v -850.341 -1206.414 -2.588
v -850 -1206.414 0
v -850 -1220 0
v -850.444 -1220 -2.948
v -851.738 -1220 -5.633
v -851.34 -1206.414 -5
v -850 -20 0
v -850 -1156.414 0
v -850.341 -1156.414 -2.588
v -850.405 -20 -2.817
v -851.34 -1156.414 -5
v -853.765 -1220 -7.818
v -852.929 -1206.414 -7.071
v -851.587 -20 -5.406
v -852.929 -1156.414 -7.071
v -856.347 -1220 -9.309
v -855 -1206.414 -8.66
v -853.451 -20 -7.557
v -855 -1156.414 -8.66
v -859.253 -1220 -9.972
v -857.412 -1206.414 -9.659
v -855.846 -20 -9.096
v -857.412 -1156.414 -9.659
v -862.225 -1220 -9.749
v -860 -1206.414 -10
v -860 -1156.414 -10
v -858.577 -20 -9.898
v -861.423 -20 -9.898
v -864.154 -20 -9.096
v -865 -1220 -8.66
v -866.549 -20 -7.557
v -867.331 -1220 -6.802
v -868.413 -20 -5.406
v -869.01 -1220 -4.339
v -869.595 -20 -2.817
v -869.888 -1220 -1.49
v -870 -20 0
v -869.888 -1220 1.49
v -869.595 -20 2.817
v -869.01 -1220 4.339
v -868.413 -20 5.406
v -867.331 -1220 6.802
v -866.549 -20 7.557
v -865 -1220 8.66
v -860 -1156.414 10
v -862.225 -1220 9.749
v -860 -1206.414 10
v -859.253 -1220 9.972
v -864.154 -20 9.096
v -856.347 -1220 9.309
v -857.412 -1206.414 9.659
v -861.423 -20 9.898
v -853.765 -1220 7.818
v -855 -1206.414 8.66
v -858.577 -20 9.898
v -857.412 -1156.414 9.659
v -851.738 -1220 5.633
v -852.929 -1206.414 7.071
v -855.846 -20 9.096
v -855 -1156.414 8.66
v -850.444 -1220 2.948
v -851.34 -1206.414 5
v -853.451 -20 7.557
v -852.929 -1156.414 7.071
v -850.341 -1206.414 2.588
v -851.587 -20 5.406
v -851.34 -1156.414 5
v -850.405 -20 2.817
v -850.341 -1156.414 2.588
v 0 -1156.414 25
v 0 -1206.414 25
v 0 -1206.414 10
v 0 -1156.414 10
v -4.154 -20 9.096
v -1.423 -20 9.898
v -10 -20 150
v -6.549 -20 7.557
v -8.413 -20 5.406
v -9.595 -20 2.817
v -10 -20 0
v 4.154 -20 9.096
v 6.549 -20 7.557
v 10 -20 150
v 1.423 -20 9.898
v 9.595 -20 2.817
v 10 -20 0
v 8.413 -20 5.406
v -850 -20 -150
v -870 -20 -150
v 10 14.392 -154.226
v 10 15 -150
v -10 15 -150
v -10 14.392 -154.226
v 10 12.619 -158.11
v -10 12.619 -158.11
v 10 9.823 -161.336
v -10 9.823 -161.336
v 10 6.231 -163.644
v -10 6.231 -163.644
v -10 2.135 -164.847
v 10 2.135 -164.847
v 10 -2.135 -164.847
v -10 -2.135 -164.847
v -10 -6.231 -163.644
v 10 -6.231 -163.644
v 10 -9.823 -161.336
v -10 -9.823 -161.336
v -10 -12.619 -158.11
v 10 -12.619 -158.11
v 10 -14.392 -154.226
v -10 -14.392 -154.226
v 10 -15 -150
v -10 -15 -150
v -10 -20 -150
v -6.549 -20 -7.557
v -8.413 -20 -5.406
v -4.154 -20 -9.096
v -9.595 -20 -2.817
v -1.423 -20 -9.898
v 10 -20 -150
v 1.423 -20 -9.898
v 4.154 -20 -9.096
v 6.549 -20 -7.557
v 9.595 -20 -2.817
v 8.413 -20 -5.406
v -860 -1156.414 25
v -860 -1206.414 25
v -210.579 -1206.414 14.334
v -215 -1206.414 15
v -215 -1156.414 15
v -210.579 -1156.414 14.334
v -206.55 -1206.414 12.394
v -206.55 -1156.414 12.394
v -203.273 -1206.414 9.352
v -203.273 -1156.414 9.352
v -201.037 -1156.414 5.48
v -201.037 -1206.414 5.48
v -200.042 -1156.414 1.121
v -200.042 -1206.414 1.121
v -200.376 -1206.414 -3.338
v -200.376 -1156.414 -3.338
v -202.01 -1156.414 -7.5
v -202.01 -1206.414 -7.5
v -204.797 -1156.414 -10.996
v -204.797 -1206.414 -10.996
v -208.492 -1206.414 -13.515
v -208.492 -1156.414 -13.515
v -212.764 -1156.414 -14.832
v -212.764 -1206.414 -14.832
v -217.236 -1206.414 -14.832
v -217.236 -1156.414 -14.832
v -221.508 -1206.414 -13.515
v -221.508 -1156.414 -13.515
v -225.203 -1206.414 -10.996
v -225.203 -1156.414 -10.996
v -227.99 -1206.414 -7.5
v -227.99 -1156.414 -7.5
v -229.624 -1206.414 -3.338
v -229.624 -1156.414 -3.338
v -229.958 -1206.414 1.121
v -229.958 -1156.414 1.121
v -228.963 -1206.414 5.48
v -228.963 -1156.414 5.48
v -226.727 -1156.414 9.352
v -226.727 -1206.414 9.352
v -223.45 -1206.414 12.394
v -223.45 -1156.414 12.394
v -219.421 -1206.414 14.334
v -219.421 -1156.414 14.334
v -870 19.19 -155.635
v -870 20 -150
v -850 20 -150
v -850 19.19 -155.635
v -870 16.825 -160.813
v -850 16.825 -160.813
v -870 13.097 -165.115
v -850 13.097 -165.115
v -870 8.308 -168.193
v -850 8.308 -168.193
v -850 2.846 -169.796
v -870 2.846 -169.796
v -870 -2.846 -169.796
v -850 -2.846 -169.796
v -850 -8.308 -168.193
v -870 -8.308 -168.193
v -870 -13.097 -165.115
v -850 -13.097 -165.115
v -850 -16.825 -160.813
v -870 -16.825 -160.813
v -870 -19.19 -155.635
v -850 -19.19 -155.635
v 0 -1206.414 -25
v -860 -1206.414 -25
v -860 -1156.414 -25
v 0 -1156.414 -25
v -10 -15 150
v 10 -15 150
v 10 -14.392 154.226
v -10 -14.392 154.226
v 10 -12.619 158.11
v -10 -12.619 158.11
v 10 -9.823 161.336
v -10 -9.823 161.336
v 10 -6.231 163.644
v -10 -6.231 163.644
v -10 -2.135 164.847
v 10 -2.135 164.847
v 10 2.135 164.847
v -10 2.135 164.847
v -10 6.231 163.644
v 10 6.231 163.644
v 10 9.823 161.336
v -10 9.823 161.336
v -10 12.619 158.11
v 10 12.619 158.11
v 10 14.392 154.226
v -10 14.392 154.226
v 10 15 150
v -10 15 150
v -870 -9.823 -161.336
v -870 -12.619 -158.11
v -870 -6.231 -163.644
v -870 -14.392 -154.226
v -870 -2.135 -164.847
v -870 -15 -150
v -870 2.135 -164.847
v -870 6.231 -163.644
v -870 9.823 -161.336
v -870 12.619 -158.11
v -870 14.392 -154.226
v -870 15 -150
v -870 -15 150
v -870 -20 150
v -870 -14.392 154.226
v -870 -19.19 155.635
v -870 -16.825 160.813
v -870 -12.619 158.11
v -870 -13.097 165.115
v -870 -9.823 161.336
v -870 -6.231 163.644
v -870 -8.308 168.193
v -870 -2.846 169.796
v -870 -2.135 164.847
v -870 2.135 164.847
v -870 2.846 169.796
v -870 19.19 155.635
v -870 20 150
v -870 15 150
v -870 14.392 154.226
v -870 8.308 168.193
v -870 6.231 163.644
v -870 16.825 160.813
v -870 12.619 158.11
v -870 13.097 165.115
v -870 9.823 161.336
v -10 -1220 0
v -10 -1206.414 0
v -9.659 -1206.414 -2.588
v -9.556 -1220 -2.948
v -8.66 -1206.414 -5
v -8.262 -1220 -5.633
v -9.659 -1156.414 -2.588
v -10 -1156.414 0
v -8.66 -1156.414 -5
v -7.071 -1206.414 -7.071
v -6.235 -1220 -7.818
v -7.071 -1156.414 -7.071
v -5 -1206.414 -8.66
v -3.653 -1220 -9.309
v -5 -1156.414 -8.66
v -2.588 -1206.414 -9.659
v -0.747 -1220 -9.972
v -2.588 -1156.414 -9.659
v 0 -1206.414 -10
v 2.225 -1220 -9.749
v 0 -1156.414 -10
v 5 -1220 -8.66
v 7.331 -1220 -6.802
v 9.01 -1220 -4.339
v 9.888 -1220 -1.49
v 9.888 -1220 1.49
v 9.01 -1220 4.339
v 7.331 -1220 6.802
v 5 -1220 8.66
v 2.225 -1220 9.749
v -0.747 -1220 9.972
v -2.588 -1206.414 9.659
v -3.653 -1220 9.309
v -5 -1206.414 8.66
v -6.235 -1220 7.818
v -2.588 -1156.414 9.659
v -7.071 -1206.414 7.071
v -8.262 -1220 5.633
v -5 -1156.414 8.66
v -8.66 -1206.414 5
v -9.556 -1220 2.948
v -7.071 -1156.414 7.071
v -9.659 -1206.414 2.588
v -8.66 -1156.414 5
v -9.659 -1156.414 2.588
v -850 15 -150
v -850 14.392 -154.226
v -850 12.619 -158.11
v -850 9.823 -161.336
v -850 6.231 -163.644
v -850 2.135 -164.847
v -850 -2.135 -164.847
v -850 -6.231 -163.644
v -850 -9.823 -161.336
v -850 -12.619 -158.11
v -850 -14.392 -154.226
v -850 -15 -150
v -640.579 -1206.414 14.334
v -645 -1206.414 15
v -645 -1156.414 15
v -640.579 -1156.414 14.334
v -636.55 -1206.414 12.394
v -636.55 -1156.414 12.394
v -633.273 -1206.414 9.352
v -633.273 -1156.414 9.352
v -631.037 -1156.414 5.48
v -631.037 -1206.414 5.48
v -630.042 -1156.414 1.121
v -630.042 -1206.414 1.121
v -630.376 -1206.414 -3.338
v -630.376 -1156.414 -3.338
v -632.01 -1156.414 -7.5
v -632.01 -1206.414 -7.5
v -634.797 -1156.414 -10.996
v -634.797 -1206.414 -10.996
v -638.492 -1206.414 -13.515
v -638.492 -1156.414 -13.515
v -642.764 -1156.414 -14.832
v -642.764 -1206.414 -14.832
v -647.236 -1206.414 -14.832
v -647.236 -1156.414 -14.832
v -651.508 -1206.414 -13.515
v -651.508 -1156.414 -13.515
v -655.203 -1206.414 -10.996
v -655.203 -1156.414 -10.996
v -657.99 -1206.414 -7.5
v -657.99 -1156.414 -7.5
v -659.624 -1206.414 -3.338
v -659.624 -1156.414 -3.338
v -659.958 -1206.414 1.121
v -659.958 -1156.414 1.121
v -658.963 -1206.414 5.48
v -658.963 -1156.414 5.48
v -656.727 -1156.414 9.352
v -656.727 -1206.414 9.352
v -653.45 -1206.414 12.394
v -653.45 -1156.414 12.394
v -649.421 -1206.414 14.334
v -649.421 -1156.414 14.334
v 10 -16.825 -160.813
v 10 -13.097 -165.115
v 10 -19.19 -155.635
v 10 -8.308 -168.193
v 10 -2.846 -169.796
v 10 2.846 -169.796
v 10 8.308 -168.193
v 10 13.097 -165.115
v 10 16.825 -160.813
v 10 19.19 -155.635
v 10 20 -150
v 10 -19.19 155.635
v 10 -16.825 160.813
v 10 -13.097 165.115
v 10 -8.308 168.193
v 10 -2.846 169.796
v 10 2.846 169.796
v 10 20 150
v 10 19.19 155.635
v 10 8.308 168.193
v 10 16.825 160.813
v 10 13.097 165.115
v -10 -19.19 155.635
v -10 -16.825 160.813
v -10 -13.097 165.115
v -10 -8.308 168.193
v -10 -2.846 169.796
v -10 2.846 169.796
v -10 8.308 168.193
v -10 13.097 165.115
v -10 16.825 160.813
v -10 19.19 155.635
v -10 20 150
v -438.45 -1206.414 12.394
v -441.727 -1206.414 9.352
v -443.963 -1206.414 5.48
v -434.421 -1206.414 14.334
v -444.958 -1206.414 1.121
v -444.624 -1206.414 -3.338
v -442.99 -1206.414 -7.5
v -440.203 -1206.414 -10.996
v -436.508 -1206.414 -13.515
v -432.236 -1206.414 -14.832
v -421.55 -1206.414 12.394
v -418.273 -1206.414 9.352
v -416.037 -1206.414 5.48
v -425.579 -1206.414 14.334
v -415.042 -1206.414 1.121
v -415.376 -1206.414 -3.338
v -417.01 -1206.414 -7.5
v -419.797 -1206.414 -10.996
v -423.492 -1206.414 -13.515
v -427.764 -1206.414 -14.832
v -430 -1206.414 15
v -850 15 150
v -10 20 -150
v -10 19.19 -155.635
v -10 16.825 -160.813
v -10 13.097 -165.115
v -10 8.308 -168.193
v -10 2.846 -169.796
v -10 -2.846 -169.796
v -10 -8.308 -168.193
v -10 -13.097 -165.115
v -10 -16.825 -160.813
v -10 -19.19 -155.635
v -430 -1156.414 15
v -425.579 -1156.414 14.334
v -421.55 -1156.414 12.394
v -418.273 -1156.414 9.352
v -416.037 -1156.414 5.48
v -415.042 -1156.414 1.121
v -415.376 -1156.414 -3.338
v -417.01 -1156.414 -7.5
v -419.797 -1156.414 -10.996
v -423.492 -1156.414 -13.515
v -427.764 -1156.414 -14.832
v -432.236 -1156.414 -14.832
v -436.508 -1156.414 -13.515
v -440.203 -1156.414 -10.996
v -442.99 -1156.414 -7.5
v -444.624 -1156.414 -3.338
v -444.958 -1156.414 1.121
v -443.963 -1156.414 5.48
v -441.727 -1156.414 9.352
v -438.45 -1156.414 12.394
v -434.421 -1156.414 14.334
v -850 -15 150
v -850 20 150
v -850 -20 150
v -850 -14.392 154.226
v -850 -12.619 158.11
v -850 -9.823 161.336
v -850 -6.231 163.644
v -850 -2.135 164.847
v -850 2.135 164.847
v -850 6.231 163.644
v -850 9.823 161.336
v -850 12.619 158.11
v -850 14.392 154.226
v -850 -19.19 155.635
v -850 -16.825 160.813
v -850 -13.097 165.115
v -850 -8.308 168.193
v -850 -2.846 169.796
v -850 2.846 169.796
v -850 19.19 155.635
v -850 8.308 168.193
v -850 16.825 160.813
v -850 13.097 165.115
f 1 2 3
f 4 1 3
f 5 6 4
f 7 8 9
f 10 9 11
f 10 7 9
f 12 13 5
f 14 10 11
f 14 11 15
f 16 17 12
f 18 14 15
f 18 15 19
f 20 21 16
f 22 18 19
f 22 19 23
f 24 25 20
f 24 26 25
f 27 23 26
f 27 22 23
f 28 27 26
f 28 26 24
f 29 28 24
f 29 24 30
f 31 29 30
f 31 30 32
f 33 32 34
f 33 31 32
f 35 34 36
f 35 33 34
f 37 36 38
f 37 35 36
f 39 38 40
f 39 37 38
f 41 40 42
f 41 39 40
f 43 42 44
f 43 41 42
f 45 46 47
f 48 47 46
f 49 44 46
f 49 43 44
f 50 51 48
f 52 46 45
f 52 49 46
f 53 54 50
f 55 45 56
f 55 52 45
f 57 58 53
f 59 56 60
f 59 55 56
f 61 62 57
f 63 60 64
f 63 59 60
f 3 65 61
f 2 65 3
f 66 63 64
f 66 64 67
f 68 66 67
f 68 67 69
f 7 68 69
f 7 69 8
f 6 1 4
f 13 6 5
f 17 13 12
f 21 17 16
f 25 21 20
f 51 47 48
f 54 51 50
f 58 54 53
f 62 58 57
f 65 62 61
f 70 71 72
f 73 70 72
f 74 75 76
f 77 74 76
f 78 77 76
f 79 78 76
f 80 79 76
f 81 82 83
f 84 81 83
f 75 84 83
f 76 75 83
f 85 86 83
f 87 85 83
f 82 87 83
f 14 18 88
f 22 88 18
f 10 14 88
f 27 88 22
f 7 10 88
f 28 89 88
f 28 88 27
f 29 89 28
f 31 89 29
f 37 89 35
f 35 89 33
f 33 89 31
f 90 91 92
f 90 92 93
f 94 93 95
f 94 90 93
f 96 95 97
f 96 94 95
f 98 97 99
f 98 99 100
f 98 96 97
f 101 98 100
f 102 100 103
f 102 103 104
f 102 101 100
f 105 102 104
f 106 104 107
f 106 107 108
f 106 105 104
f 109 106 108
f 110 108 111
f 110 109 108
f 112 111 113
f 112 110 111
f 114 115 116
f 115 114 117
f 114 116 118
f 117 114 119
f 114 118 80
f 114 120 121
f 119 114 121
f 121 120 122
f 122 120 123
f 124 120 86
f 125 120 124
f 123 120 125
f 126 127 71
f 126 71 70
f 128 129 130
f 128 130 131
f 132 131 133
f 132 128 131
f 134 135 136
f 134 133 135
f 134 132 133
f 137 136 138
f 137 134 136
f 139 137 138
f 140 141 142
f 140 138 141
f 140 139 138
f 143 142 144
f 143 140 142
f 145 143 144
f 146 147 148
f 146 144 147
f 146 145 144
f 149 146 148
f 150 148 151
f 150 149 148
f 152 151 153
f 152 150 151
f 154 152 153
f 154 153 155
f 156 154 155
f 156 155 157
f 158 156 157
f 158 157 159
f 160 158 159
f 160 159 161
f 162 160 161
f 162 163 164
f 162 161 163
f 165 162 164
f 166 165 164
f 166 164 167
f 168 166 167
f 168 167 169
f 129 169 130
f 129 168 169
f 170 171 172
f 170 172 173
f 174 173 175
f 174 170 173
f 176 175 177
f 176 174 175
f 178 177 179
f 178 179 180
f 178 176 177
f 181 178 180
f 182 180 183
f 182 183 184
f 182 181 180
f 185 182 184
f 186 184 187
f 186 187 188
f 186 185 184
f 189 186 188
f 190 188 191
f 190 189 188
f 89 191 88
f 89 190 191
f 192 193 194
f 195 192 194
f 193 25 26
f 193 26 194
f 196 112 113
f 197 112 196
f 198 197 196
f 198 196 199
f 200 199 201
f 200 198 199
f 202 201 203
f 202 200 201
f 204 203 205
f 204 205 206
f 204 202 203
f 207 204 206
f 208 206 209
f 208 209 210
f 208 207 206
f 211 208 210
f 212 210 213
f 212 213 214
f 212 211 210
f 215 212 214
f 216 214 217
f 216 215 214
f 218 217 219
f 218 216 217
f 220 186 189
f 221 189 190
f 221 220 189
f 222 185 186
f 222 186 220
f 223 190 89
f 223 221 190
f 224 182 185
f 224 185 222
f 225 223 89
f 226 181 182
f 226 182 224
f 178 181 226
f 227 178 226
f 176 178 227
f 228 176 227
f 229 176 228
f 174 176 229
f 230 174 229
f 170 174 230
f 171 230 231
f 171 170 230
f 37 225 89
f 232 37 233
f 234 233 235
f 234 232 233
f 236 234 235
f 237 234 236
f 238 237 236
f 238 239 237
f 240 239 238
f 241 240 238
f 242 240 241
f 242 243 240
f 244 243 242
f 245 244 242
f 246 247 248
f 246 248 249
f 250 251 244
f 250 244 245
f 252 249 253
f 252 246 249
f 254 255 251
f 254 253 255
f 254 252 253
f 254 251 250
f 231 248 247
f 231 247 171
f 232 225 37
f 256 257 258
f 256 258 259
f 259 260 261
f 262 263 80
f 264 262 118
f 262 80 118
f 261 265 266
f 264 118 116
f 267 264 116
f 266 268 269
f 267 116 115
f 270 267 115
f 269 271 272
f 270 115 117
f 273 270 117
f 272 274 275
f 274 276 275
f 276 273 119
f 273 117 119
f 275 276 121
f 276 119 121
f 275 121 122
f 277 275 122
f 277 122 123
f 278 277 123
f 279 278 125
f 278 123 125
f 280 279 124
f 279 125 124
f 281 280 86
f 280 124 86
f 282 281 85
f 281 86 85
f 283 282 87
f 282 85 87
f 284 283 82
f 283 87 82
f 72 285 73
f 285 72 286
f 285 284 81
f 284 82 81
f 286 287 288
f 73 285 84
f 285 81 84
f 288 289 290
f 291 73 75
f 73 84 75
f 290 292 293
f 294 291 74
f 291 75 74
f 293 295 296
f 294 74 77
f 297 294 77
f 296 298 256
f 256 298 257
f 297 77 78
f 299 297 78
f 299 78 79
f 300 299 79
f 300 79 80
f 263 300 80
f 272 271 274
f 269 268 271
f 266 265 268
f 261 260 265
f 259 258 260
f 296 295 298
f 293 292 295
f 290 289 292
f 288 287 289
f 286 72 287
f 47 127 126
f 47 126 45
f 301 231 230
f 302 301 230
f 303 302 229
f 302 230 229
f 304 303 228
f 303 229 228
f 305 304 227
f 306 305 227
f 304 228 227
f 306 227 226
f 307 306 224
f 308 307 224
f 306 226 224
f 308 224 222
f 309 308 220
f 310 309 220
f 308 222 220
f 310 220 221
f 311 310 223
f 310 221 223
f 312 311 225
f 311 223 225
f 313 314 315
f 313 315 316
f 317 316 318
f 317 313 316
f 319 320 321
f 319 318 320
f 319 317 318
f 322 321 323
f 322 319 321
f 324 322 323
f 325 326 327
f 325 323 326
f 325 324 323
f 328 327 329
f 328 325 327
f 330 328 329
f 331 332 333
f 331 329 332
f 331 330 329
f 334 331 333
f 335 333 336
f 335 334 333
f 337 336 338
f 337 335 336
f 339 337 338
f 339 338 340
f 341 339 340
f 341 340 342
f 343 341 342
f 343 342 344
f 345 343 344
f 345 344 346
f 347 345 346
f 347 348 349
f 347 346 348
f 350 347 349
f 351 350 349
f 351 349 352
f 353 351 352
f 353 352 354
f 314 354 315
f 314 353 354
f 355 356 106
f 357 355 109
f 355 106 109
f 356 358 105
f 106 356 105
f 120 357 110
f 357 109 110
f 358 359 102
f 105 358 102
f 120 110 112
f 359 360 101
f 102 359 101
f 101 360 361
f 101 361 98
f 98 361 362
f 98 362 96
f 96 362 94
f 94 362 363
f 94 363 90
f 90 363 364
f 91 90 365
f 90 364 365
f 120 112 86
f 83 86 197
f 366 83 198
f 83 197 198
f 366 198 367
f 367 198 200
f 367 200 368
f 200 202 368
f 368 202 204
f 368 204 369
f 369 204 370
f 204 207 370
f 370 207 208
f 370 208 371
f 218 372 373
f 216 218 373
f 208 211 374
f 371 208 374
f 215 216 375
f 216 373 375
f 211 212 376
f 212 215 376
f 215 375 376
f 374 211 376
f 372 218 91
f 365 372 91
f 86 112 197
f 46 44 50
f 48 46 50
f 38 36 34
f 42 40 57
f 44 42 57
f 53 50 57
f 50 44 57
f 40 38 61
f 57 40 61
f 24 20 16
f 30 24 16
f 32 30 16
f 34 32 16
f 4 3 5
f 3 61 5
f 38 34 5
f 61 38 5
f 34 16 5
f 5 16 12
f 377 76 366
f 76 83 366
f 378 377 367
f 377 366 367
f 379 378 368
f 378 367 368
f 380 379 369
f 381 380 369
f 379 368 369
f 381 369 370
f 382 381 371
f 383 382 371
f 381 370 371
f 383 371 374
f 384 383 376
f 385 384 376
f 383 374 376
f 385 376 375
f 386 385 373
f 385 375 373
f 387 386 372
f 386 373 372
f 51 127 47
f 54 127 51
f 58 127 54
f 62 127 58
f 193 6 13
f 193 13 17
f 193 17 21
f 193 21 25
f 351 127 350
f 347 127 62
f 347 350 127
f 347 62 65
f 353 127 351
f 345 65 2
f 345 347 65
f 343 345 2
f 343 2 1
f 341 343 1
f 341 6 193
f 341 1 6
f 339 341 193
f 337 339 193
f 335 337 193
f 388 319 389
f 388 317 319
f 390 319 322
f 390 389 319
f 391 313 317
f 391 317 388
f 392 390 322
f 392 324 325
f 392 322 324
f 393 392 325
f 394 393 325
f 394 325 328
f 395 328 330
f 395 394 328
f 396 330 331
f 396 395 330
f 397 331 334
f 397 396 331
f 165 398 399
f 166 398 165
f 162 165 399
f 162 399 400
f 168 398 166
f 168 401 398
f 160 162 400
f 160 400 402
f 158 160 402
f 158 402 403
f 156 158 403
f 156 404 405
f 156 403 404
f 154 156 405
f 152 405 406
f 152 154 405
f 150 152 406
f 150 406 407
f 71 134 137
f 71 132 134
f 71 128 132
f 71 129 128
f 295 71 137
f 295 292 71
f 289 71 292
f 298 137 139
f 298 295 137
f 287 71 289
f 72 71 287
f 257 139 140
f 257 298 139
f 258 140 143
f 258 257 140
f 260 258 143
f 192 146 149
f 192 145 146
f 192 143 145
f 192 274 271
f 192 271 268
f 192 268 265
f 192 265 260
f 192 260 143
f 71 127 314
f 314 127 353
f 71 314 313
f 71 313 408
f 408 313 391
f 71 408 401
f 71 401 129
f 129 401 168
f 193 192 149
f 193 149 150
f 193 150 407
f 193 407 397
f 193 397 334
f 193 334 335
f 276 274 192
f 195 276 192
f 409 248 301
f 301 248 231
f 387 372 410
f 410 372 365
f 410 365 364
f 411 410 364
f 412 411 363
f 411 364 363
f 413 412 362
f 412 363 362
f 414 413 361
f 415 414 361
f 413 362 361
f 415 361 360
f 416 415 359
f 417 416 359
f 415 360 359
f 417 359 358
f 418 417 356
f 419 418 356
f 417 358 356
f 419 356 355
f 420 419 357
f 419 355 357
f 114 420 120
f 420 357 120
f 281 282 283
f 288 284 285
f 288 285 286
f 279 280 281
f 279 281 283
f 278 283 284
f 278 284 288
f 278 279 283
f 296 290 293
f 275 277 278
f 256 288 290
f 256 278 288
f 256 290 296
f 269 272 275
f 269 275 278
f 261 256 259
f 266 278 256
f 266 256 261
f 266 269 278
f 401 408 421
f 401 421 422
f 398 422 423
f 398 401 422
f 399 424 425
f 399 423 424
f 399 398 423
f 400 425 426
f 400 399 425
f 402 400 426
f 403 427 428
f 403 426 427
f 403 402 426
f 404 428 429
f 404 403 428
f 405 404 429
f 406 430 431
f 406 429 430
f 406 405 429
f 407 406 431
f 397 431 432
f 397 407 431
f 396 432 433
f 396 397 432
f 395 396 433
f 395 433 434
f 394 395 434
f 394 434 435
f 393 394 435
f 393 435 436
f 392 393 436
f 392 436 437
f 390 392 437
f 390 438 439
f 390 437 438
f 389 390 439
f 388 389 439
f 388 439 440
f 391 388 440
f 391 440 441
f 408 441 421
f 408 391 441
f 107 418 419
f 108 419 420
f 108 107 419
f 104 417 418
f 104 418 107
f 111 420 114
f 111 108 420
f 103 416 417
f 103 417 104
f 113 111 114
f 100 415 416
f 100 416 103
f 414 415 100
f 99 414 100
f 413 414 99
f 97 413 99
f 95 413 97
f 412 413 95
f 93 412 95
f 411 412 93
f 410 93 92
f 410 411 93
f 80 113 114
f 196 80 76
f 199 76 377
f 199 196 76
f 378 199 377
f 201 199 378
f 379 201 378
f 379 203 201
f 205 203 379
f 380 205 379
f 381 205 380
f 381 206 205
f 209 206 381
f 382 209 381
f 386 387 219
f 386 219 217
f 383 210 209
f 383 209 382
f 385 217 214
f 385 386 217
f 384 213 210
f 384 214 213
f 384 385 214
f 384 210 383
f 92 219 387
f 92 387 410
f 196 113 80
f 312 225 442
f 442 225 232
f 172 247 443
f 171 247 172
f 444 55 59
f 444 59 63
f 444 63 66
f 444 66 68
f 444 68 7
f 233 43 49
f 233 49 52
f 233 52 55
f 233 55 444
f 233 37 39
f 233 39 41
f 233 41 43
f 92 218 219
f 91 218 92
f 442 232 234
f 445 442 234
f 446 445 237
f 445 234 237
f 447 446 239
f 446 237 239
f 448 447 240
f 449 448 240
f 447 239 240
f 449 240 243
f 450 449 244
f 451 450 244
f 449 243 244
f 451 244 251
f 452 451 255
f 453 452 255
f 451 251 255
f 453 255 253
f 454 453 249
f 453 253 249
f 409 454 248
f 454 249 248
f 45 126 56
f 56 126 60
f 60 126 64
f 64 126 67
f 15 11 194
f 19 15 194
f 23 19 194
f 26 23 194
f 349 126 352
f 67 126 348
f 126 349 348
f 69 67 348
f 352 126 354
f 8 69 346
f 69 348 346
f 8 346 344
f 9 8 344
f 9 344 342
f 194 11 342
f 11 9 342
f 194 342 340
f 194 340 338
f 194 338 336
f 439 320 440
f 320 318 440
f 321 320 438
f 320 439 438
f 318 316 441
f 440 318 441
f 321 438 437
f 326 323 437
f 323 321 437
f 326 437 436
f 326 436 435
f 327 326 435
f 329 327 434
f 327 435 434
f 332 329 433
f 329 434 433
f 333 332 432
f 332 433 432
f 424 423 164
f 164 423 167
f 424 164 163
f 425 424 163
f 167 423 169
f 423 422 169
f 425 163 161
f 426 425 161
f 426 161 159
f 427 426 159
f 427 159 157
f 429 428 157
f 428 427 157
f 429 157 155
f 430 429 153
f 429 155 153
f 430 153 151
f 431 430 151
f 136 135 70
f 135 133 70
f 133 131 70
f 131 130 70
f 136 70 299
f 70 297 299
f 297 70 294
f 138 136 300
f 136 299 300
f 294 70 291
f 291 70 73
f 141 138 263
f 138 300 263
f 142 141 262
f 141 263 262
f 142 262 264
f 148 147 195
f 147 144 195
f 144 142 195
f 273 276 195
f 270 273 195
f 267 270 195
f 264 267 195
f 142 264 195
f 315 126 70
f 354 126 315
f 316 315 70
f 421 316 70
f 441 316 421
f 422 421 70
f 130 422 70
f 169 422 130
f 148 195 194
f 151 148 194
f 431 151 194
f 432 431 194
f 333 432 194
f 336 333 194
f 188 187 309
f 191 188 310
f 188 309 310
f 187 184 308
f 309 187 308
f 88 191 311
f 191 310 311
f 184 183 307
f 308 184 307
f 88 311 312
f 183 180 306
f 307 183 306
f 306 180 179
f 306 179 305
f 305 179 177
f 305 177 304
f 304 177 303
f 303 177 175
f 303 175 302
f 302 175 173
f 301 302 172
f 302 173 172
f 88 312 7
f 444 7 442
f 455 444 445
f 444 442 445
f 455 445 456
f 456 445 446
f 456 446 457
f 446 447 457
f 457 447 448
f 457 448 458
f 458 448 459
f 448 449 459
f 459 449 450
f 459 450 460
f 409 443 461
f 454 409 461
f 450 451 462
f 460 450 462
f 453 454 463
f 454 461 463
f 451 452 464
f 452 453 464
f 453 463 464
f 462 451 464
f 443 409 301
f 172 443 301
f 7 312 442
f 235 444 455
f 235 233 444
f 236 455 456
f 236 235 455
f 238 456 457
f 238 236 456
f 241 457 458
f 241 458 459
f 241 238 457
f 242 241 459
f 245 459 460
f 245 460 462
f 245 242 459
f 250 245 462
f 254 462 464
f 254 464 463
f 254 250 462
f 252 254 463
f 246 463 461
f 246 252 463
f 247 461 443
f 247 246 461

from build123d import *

# Parameters (mm, degrees)
BOSS_EXTRUDE1_DEPTH     = 10
SKETCH2_R               = 10
BOSS_EXTRUDE2_DEPTH     = 1200
SKETCH4_W               = 50
SKETCH4_H               = 50
BOSS_EXTRUDE3_DEPTH     = 860
CUT_EXTRUDE2_DEPTH      = 1468.122841414
CUT_EXTRUDE2_DEPTH_BACK = 1468.122841414
SKETCH6_R               = 15


with BuildPart() as part:
    # Sketch1 → Boss-Extrude1 (new, symmetric)
    with BuildSketch(Plane(origin=(0, 0, 0), x_dir=(0, 0, -1), z_dir=(1, 0, 0))):
        with BuildLine():
            Line((150, -20), (-150, -20))
            ThreePointArc((-150, -20), (-170, 0), (-150, 20))
            Line((-150, 20), (150, 20))
            ThreePointArc((150, 20), (170, 0), (150, -20))
        make_face()
        with BuildLine():
            Line((-150, 15), (150, 15))
            ThreePointArc((150, 15), (165, 0), (150, -15))
            Line((150, -15), (-150, -15))
            ThreePointArc((-150, -15), (-165, 0), (-150, 15))
        make_face(mode=Mode.SUBTRACT)
    boss_extrude1 = extrude(amount=BOSS_EXTRUDE1_DEPTH, both=True)

    # Sketch2 → Boss-Extrude2 (add)
    with BuildSketch(Plane.XZ.offset(20)):
        with Locations(Location((0, 0, 0), (0, 0, 180))):
            Circle(SKETCH2_R)
    boss_extrude2 = extrude(amount=BOSS_EXTRUDE2_DEPTH)

    # Sketch4 → Boss-Extrude3 (add)
    with BuildSketch(Plane(origin=(0, 0, 0), x_dir=(0, 0, -1), z_dir=(1, 0, 0))):
        with Locations((0, -1181.413801262)):
            Rectangle(SKETCH4_W, SKETCH4_H)
    extrude(amount=-BOSS_EXTRUDE3_DEPTH)

    # Sketch6 → Cut-Extrude2 (cut, two sides: drawn at the far end of the back side and taken through both)
    with BuildSketch(Plane(origin=(0, -1156.413801262, 0), x_dir=(1, 0, 0), z_dir=(0, 1, 0)).offset(-CUT_EXTRUDE2_DEPTH_BACK)):
        with Locations(Location((-645, 0, 0), (0, 0, 270))):
            Circle(SKETCH6_R)
        with Locations(Location((-430, 0, 0), (0, 0, 270))):
            Circle(SKETCH6_R)
        with Locations(Location((-215, 0, 0), (0, 0, 270))):
            Circle(SKETCH6_R)
    extrude(amount=CUT_EXTRUDE2_DEPTH + CUT_EXTRUDE2_DEPTH_BACK, mode=Mode.SUBTRACT)

    # Mirror1: Boss-Extrude2 across plane
    add(boss_extrude2.mirror(Plane(origin=(-430, 0, 0), x_dir=(0, 0, 1), z_dir=(1, 0, 0))))

    # Mirror2: Boss-Extrude1 across plane
    add(boss_extrude1.mirror(Plane(origin=(-430, 0, 0), x_dir=(0, 0, 1), z_dir=(1, 0, 0))))


solid = part.part
